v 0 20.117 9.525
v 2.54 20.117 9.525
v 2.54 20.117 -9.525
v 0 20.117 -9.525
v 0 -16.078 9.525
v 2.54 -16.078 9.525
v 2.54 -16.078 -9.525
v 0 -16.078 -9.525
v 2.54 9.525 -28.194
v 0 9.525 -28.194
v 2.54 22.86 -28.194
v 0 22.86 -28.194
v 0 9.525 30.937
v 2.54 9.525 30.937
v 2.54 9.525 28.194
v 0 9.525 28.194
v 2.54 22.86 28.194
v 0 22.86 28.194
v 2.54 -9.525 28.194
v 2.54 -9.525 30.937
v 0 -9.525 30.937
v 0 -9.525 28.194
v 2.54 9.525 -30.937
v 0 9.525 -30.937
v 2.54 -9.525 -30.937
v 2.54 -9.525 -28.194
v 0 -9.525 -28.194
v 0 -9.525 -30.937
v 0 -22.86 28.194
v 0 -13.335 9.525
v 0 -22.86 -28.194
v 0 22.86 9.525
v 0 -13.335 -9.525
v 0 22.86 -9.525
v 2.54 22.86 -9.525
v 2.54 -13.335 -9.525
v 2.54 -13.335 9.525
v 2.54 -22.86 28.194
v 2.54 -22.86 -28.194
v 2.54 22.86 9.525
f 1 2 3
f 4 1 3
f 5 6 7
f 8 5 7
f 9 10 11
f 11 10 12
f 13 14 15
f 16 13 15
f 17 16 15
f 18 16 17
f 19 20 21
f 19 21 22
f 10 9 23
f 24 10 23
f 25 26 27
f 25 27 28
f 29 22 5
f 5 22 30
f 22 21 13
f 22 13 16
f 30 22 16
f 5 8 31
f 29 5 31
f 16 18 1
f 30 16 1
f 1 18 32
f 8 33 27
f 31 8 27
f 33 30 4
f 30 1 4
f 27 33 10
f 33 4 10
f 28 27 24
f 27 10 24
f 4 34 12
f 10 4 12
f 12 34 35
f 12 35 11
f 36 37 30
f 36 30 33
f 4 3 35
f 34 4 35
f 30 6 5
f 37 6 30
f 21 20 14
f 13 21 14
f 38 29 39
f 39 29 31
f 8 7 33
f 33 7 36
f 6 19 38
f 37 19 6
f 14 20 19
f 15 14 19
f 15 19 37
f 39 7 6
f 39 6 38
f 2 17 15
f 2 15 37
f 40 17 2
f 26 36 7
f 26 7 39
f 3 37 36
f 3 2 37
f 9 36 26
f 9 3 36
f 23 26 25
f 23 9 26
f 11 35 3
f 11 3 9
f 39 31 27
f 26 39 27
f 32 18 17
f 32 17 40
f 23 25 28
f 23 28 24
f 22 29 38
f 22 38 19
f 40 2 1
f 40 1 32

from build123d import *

# Parameters (mm, degrees)
SKETCH1_W           = 56.388
SKETCH1_H           = 45.72
BOSS_EXTRUDE1_DEPTH = 2.54
SKETCH2_W           = 2.7432
SKETCH2_H           = 19.05
BOSS_EXTRUDE2_DEPTH = 2.54
SKETCH3_W           = 19.05
SKETCH3_H           = 2.7432
CUT_EXTRUDE1_DEPTH  = 3.54


with BuildPart() as part:
    # Sketch1 → Boss-Extrude1 (new body)
    with BuildSketch(Plane(origin=(0, 0, 0), x_dir=(0, 0, -1), z_dir=(1, 0, 0))):
        Rectangle(SKETCH1_W, SKETCH1_H)
    extrude(amount=BOSS_EXTRUDE1_DEPTH)

    # Sketch2 → Boss-Extrude2 (add)
    with BuildSketch(Plane(origin=(2.54, 0, 0), x_dir=(0, 0, -1), z_dir=(1, 0, 0))):
        with Locations((-29.5656, 0)):
            Rectangle(SKETCH2_W, SKETCH2_H)
        with Locations((29.5656, 0)):
            Rectangle(SKETCH2_W, SKETCH2_H)
    extrude(amount=-BOSS_EXTRUDE2_DEPTH)

    # Sketch3 → Cut-Extrude1 (cut, through all)
    with BuildSketch(Plane(origin=(2.54, 0, 0), x_dir=(0, 0, -1), z_dir=(1, 0, 0))):
        with Locations((0, 21.4884)):
            Rectangle(SKETCH3_W, SKETCH3_H)
        with Locations((0, -14.7066)):
            Rectangle(SKETCH3_W, SKETCH3_H)
    extrude(amount=-CUT_EXTRUDE1_DEPTH, mode=Mode.SUBTRACT)


solid = part.part
